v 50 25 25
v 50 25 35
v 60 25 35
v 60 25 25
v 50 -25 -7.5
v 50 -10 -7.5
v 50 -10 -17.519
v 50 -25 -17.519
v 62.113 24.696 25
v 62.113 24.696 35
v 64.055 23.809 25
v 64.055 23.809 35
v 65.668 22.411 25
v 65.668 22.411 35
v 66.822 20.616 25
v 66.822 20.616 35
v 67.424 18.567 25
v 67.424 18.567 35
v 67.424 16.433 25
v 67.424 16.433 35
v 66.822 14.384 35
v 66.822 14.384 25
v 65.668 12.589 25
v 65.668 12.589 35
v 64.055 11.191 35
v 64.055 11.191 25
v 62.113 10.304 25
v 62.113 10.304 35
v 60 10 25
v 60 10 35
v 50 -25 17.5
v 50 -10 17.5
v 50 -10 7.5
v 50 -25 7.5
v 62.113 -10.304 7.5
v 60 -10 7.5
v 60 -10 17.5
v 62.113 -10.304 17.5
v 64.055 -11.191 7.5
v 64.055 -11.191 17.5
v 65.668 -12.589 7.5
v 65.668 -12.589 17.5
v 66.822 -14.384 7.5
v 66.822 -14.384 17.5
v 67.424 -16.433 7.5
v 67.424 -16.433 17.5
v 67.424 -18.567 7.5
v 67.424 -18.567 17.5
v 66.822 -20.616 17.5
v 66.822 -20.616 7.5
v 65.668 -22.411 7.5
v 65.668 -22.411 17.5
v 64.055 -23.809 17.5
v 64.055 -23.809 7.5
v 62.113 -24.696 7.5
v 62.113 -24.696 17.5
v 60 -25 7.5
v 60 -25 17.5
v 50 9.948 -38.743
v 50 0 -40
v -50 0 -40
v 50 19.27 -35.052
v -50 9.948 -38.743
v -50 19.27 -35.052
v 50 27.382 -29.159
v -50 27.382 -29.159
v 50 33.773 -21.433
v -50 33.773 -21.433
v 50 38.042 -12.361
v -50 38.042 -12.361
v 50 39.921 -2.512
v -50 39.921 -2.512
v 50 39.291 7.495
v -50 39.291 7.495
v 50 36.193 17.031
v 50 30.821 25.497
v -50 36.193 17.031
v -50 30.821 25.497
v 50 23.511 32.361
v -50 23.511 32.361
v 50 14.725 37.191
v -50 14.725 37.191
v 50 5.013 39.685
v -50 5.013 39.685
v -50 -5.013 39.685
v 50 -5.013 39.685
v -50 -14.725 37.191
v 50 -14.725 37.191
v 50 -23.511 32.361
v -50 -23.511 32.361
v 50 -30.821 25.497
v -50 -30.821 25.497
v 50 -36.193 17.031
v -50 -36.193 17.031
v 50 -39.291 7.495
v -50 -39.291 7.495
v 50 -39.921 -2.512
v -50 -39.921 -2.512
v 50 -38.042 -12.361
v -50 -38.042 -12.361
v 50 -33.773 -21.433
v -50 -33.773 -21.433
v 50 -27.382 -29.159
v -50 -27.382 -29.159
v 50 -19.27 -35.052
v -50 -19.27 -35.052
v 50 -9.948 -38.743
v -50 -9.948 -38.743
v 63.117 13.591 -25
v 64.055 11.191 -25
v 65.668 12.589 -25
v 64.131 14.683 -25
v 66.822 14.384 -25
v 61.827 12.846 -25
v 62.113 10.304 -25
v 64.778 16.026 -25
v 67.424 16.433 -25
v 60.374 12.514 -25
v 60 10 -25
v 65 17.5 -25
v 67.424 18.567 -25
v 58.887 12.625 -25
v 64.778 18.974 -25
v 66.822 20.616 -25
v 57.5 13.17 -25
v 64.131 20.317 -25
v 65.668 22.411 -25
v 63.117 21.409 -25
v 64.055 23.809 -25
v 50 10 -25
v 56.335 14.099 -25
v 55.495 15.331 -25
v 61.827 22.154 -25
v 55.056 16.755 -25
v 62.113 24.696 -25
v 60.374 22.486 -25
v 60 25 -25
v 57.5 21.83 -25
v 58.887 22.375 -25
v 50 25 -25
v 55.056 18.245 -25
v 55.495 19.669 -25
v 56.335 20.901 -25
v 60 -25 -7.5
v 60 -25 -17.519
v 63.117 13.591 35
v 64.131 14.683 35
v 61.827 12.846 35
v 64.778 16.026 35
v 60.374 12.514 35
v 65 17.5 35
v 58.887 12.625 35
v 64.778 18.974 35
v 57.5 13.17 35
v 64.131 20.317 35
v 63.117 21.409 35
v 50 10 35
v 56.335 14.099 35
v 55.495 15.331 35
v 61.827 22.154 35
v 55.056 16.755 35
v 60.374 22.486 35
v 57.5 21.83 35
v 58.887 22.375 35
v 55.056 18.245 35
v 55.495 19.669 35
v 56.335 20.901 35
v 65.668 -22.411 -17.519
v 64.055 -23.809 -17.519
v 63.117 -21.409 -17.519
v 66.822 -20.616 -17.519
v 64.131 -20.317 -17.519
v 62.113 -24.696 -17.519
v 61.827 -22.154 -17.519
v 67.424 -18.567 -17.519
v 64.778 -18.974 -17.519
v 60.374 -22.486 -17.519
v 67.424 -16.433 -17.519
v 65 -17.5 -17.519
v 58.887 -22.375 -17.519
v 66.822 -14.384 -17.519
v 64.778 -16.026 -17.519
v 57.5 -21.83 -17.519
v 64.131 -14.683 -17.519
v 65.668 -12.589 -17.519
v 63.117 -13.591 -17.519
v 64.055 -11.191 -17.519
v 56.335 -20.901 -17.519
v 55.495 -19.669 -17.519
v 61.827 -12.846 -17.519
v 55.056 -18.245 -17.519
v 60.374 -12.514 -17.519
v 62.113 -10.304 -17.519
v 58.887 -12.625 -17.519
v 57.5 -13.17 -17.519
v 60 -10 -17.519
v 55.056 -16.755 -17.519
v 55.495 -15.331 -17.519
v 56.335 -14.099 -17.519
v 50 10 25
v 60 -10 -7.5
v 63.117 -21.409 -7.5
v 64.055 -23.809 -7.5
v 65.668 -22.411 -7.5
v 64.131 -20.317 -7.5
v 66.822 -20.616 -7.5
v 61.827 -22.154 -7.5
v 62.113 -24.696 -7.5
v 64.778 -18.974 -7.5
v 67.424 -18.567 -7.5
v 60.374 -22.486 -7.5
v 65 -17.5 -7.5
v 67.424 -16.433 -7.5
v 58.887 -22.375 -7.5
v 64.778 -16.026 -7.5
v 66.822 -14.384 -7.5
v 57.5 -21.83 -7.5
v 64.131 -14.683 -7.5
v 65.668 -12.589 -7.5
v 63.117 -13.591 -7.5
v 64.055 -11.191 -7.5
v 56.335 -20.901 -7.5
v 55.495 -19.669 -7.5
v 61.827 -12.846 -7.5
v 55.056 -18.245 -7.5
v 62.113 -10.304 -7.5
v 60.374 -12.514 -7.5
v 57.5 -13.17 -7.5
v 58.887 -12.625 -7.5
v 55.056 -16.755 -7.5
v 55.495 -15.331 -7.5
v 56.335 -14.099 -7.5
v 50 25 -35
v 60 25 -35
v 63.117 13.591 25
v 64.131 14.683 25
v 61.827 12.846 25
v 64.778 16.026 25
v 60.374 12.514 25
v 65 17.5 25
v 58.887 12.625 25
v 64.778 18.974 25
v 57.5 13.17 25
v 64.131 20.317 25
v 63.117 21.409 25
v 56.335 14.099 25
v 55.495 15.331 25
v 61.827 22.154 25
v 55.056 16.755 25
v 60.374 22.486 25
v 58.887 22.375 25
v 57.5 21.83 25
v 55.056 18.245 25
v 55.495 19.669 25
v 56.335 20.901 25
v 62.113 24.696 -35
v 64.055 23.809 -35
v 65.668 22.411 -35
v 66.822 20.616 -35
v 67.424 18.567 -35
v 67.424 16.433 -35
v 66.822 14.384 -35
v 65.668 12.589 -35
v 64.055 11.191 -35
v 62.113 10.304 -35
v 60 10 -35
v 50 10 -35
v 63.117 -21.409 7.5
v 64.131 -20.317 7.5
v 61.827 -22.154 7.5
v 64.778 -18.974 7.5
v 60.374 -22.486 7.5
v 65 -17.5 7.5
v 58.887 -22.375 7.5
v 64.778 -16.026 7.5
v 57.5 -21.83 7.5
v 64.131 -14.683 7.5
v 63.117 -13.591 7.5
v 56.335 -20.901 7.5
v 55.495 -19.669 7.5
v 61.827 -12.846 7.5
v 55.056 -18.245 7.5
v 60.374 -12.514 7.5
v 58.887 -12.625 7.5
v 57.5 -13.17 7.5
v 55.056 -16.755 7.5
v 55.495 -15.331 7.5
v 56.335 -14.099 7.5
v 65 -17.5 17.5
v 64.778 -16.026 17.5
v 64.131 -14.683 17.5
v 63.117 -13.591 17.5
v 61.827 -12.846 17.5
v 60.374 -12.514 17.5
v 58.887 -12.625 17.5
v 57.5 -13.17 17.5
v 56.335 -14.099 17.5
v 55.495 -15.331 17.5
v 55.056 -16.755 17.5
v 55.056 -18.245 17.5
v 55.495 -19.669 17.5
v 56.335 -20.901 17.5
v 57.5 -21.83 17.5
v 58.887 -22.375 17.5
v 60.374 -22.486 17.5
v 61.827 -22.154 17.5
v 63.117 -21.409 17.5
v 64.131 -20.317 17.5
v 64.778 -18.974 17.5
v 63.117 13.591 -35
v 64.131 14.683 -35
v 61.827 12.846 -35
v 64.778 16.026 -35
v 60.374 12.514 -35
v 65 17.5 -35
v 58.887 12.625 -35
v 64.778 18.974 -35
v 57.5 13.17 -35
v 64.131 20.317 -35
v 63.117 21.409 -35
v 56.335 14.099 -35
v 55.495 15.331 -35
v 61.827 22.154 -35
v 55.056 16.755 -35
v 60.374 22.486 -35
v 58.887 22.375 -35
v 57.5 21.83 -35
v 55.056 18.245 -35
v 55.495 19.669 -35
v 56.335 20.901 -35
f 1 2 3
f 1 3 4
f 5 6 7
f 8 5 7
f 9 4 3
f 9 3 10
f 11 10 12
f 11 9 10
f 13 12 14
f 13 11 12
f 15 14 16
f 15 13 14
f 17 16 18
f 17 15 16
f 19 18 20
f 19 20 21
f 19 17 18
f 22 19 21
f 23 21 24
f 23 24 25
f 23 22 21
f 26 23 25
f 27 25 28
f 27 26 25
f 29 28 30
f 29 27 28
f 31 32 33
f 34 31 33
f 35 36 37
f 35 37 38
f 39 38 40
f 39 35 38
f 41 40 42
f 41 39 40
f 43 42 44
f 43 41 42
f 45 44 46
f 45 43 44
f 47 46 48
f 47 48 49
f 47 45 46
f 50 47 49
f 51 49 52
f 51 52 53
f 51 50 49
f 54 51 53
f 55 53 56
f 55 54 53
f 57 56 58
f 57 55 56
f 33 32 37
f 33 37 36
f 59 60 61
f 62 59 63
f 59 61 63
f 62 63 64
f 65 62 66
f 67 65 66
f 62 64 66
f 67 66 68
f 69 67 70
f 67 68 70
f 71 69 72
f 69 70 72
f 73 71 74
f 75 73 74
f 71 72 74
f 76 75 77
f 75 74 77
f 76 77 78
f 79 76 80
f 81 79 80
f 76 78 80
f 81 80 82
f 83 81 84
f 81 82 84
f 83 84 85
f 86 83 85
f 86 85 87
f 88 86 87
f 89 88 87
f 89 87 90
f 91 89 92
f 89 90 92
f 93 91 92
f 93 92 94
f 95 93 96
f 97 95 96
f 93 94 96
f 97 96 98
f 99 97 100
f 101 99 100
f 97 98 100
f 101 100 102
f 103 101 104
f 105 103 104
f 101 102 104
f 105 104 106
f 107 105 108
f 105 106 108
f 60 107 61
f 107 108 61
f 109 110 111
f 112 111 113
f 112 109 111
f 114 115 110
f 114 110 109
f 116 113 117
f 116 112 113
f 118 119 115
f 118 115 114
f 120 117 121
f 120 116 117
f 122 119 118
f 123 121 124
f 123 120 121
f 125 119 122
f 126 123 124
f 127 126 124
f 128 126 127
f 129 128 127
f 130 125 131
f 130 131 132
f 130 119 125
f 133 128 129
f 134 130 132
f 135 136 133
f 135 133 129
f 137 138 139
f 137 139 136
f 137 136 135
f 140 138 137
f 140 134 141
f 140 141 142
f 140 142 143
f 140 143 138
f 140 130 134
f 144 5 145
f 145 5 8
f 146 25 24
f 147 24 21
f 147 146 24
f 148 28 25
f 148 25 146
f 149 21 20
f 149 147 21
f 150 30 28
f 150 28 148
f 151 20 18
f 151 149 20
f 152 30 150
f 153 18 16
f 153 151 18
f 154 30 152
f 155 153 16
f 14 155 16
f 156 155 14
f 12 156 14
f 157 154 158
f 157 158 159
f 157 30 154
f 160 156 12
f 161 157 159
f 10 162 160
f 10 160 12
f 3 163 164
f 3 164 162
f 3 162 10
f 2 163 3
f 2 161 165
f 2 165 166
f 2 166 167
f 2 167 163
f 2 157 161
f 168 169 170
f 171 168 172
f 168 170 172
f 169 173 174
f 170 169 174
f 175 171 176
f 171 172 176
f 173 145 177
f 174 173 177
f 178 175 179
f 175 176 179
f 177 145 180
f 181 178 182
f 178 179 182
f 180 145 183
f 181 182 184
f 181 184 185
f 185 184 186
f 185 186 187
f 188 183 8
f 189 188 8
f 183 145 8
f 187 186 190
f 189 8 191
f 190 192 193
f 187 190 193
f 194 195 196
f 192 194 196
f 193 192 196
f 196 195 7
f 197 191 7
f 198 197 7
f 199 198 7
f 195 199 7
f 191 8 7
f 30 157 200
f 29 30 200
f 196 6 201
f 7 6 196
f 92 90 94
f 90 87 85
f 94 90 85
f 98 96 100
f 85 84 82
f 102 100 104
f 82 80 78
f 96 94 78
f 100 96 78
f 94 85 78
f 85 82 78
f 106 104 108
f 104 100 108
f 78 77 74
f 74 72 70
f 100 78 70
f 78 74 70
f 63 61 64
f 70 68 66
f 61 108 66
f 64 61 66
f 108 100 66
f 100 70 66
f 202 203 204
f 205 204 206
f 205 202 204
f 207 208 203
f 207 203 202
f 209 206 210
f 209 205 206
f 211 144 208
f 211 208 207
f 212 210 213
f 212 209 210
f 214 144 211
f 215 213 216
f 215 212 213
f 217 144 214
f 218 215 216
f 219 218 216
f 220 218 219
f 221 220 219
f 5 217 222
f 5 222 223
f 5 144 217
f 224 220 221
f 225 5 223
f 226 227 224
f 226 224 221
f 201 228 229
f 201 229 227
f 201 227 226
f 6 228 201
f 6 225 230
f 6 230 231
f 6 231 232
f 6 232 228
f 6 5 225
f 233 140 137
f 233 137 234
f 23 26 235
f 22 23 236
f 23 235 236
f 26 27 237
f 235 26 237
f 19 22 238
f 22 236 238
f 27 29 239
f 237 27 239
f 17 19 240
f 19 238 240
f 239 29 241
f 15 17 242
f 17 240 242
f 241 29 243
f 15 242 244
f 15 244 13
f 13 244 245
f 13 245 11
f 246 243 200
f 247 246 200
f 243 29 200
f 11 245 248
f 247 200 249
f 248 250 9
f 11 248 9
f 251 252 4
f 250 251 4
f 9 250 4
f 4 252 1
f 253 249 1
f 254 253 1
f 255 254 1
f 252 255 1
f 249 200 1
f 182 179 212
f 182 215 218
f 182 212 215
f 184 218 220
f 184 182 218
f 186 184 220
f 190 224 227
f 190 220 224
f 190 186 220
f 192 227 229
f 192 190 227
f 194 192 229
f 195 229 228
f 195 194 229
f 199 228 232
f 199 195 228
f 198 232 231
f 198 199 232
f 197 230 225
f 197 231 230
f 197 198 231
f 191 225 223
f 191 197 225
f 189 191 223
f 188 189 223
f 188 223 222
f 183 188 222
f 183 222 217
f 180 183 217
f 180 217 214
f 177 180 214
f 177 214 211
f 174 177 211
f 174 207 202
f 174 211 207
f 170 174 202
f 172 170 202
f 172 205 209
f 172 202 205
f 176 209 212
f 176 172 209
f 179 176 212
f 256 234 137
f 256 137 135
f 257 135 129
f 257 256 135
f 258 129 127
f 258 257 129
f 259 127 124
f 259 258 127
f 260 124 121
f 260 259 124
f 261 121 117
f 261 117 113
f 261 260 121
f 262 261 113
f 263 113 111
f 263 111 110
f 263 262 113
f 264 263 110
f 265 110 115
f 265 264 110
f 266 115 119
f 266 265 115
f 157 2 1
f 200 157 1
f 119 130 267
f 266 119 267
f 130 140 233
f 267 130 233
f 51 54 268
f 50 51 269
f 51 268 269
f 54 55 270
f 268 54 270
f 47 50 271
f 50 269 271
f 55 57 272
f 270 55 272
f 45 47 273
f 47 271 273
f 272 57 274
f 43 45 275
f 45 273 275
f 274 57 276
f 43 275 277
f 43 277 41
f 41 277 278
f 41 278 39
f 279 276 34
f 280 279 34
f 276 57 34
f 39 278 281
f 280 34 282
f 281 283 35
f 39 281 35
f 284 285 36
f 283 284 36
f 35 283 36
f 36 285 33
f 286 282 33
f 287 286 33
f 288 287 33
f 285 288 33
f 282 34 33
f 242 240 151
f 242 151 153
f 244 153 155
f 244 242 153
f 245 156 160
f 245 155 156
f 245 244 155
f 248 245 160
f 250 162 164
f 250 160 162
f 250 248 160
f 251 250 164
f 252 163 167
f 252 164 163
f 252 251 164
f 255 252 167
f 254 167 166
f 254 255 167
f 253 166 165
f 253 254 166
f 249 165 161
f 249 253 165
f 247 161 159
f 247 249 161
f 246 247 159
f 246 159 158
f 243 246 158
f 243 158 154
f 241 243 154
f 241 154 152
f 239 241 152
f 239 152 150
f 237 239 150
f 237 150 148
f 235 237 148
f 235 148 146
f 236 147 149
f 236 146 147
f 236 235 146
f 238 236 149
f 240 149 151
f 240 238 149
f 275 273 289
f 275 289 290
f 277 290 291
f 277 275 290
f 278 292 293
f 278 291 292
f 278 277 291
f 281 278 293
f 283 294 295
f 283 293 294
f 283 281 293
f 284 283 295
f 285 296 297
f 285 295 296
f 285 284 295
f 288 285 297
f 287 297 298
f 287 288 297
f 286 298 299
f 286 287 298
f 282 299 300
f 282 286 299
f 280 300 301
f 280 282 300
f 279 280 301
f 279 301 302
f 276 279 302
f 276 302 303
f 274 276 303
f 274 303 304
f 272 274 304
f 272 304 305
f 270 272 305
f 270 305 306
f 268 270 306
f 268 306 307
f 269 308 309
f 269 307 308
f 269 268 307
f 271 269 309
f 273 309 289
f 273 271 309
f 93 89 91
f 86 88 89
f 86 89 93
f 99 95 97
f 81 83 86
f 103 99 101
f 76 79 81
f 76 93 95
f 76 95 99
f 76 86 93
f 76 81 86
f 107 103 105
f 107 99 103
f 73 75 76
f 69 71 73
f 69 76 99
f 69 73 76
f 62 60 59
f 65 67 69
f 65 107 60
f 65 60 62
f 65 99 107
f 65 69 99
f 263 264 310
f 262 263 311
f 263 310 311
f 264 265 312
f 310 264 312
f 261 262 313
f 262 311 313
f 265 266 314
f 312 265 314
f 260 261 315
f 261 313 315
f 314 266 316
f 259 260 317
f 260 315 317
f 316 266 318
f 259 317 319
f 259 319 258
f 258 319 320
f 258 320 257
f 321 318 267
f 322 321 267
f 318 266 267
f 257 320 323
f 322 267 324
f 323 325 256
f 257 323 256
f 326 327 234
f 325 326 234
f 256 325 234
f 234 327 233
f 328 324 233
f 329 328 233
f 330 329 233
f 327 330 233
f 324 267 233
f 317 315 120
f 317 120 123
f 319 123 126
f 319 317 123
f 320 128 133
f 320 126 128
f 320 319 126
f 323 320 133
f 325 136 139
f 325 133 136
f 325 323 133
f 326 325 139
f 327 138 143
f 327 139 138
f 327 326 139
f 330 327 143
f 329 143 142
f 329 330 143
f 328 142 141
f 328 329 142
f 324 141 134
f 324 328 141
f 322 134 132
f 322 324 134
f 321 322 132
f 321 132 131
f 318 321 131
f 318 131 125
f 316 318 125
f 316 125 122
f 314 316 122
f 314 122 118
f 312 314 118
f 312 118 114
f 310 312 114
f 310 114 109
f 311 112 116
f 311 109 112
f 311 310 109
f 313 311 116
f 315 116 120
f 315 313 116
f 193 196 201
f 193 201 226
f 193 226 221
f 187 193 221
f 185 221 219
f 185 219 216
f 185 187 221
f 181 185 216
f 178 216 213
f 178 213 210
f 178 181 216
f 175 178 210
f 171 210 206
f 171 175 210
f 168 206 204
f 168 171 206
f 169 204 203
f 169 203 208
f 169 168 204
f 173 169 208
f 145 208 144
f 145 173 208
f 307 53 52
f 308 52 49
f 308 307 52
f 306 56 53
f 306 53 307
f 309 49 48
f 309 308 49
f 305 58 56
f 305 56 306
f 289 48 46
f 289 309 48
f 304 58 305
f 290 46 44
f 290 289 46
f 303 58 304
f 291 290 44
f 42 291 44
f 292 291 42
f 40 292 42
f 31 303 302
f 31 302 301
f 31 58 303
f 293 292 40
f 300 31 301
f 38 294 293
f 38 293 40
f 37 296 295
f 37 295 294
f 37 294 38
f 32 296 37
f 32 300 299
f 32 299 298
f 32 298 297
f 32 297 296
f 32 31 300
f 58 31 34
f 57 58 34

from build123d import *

# Parameters (mm, degrees)
EXTRUDE_1_DEPTH          = 50
EXTRUDE_1_DEPTH_BACK     = 50
SKETCH_1_R               = 40
SKETCH_2_W               = 10
SKETCH_2_H               = 15
EXTRUDE_2_DEPTH          = 10
EXTRUDE_2_2_DEPTH        = 10
EXTRUDE_2_3_DEPTH        = 10
SKETCH_2_W_2             = 10.018528149
EXTRUDE_2_4_DEPTH        = 10
SKETCH_4_W               = 10
SKETCH_4_H               = 7.5
SKETCH_5_W               = 10
SKETCH_5_H               = 7.5
SKETCH_6_W               = 10
SKETCH_6_H               = 7.5
SKETCH_7_W               = 10.018528149
SKETCH_7_H               = 7.5
CUT_EXTRUDE_1_DEPTH      = 109.54146673
CUT_EXTRUDE_1_DEPTH_BACK = 109.54146673
SKETCH_9_R               = 5
CUT_EXTRUDE_2_DEPTH      = 98.275382292
CUT_EXTRUDE_2_DEPTH_BACK = 98.275382292
SKETCH_10_R              = 5


with BuildPart() as part:
    # 草图1 → 凸台-拉伸1 (new, two sides: drawn at the far end of the back side and taken through both)
    with BuildSketch(Plane(origin=(0, 0, 0), x_dir=(0, 0, -1), z_dir=(1, 0, 0)).offset(-EXTRUDE_1_DEPTH_BACK)):
        Circle(SKETCH_1_R)
    extrude(amount=EXTRUDE_1_DEPTH + EXTRUDE_1_DEPTH_BACK)


with BuildPart() as body_2:
    # 草图2 → 凸台-拉伸2 (new body)
    with BuildSketch(Plane(origin=(50, 0, 0), x_dir=(0, 0, -1), z_dir=(1, 0, 0))):
        with Locations((-30, 17.5)):
            Rectangle(SKETCH_2_W, SKETCH_2_H)
    extrude(amount=EXTRUDE_2_DEPTH)

    # 草图4 → 旋转1 (revolve)
    with BuildSketch(Plane(origin=(60, 0, 0), x_dir=(0, 0, -1), z_dir=(1, 0, 0))):
        with Locations((-30, 21.25)):
            Rectangle(SKETCH_4_W, SKETCH_4_H)
    revolve(axis=Axis((60, 17.5, 35), (0, 0, -1)))


with BuildPart() as body_3:
    # 草图2 → Extrude 2 2 (new body)
    with BuildSketch(Plane(origin=(50, 0, 0), x_dir=(0, 0, -1), z_dir=(1, 0, 0))):
        with Locations((30, 17.5)):
            Rectangle(SKETCH_2_W, SKETCH_2_H)
    extrude(amount=EXTRUDE_2_2_DEPTH)

    # 草图5 → 旋转2 (revolve)
    with BuildSketch(Plane(origin=(60, 0, 0), x_dir=(0, 0, -1), z_dir=(1, 0, 0))):
        with Locations((30, 21.25)):
            Rectangle(SKETCH_5_W, SKETCH_5_H)
    revolve(axis=Axis((60, 17.5, -25), (0, 0, -1)))


with BuildPart() as body_4:
    # 草图2 → Extrude 2 3 (new body)
    with BuildSketch(Plane(origin=(50, 0, 0), x_dir=(0, 0, -1), z_dir=(1, 0, 0))):
        with Locations((-12.5, -17.5)):
            Rectangle(SKETCH_2_W, SKETCH_2_H)
    extrude(amount=EXTRUDE_2_3_DEPTH)

    # 草图6 → 旋转3 (revolve)
    with BuildSketch(Plane(origin=(60, 0, 0), x_dir=(0, 0, -1), z_dir=(1, 0, 0))):
        with Locations((-12.5, -13.75)):
            Rectangle(SKETCH_6_W, SKETCH_6_H)
    revolve(axis=Axis((60, -17.5, 17.5), (0, 0, -1)))


with BuildPart() as body_5:
    # 草图2 → Extrude 2 4 (new body)
    with BuildSketch(Plane(origin=(50, 0, 0), x_dir=(0, 0, -1), z_dir=(1, 0, 0))):
        with Locations((12.509264075, -17.5)):
            Rectangle(SKETCH_2_W_2, SKETCH_2_H)
    extrude(amount=EXTRUDE_2_4_DEPTH)

    # 草图7 → 旋转4 (revolve)
    with BuildSketch(Plane(origin=(60, 0, 0), x_dir=(0, 0, -1), z_dir=(1, 0, 0))):
        with Locations((12.509264075, -13.75)):
            Rectangle(SKETCH_7_W, SKETCH_7_H)
    revolve(axis=Axis((60, -17.5, -7.5), (0, 0, -1)))


with BuildPart() as cut_extrude_1_tool:
    # 草图9 → 切除-拉伸1 (new, two sides: drawn at the far end of the back side and taken through both)
    with BuildSketch(Plane.XY.offset(35).offset(-CUT_EXTRUDE_1_DEPTH_BACK)):
        with Locations((60, 17.5)):
            Circle(SKETCH_9_R)
    extrude(amount=CUT_EXTRUDE_1_DEPTH + CUT_EXTRUDE_1_DEPTH_BACK)


with BuildPart() as body_2_1:
    add(body_2.part)

    # 切除-拉伸1: cut by cut_extrude_1_tool
    add(cut_extrude_1_tool.part, mode=Mode.SUBTRACT)


with BuildPart() as body_3_1:
    add(body_3.part)

    # 切除-拉伸1: cut by cut_extrude_1_tool
    add(cut_extrude_1_tool.part, mode=Mode.SUBTRACT)


with BuildPart() as cut_extrude_2_tool:
    # 草图10 → 切除-拉伸2 (new, two sides: drawn at the far end of the back side and taken through both)
    with BuildSketch(Plane.XY.offset(17.5).offset(-CUT_EXTRUDE_2_DEPTH_BACK)):
        with Locations((60, -17.5)):
            Circle(SKETCH_10_R)
    extrude(amount=CUT_EXTRUDE_2_DEPTH + CUT_EXTRUDE_2_DEPTH_BACK)


with BuildPart() as body_4_1:
    add(body_4.part)

    # 切除-拉伸2: cut by cut_extrude_2_tool
    add(cut_extrude_2_tool.part, mode=Mode.SUBTRACT)


with BuildPart() as body_5_1:
    add(body_5.part)

    # 切除-拉伸2: cut by cut_extrude_2_tool
    add(cut_extrude_2_tool.part, mode=Mode.SUBTRACT)


solid = Compound([part.part, body_2_1.part, body_3_1.part, body_4_1.part, body_5_1.part])
